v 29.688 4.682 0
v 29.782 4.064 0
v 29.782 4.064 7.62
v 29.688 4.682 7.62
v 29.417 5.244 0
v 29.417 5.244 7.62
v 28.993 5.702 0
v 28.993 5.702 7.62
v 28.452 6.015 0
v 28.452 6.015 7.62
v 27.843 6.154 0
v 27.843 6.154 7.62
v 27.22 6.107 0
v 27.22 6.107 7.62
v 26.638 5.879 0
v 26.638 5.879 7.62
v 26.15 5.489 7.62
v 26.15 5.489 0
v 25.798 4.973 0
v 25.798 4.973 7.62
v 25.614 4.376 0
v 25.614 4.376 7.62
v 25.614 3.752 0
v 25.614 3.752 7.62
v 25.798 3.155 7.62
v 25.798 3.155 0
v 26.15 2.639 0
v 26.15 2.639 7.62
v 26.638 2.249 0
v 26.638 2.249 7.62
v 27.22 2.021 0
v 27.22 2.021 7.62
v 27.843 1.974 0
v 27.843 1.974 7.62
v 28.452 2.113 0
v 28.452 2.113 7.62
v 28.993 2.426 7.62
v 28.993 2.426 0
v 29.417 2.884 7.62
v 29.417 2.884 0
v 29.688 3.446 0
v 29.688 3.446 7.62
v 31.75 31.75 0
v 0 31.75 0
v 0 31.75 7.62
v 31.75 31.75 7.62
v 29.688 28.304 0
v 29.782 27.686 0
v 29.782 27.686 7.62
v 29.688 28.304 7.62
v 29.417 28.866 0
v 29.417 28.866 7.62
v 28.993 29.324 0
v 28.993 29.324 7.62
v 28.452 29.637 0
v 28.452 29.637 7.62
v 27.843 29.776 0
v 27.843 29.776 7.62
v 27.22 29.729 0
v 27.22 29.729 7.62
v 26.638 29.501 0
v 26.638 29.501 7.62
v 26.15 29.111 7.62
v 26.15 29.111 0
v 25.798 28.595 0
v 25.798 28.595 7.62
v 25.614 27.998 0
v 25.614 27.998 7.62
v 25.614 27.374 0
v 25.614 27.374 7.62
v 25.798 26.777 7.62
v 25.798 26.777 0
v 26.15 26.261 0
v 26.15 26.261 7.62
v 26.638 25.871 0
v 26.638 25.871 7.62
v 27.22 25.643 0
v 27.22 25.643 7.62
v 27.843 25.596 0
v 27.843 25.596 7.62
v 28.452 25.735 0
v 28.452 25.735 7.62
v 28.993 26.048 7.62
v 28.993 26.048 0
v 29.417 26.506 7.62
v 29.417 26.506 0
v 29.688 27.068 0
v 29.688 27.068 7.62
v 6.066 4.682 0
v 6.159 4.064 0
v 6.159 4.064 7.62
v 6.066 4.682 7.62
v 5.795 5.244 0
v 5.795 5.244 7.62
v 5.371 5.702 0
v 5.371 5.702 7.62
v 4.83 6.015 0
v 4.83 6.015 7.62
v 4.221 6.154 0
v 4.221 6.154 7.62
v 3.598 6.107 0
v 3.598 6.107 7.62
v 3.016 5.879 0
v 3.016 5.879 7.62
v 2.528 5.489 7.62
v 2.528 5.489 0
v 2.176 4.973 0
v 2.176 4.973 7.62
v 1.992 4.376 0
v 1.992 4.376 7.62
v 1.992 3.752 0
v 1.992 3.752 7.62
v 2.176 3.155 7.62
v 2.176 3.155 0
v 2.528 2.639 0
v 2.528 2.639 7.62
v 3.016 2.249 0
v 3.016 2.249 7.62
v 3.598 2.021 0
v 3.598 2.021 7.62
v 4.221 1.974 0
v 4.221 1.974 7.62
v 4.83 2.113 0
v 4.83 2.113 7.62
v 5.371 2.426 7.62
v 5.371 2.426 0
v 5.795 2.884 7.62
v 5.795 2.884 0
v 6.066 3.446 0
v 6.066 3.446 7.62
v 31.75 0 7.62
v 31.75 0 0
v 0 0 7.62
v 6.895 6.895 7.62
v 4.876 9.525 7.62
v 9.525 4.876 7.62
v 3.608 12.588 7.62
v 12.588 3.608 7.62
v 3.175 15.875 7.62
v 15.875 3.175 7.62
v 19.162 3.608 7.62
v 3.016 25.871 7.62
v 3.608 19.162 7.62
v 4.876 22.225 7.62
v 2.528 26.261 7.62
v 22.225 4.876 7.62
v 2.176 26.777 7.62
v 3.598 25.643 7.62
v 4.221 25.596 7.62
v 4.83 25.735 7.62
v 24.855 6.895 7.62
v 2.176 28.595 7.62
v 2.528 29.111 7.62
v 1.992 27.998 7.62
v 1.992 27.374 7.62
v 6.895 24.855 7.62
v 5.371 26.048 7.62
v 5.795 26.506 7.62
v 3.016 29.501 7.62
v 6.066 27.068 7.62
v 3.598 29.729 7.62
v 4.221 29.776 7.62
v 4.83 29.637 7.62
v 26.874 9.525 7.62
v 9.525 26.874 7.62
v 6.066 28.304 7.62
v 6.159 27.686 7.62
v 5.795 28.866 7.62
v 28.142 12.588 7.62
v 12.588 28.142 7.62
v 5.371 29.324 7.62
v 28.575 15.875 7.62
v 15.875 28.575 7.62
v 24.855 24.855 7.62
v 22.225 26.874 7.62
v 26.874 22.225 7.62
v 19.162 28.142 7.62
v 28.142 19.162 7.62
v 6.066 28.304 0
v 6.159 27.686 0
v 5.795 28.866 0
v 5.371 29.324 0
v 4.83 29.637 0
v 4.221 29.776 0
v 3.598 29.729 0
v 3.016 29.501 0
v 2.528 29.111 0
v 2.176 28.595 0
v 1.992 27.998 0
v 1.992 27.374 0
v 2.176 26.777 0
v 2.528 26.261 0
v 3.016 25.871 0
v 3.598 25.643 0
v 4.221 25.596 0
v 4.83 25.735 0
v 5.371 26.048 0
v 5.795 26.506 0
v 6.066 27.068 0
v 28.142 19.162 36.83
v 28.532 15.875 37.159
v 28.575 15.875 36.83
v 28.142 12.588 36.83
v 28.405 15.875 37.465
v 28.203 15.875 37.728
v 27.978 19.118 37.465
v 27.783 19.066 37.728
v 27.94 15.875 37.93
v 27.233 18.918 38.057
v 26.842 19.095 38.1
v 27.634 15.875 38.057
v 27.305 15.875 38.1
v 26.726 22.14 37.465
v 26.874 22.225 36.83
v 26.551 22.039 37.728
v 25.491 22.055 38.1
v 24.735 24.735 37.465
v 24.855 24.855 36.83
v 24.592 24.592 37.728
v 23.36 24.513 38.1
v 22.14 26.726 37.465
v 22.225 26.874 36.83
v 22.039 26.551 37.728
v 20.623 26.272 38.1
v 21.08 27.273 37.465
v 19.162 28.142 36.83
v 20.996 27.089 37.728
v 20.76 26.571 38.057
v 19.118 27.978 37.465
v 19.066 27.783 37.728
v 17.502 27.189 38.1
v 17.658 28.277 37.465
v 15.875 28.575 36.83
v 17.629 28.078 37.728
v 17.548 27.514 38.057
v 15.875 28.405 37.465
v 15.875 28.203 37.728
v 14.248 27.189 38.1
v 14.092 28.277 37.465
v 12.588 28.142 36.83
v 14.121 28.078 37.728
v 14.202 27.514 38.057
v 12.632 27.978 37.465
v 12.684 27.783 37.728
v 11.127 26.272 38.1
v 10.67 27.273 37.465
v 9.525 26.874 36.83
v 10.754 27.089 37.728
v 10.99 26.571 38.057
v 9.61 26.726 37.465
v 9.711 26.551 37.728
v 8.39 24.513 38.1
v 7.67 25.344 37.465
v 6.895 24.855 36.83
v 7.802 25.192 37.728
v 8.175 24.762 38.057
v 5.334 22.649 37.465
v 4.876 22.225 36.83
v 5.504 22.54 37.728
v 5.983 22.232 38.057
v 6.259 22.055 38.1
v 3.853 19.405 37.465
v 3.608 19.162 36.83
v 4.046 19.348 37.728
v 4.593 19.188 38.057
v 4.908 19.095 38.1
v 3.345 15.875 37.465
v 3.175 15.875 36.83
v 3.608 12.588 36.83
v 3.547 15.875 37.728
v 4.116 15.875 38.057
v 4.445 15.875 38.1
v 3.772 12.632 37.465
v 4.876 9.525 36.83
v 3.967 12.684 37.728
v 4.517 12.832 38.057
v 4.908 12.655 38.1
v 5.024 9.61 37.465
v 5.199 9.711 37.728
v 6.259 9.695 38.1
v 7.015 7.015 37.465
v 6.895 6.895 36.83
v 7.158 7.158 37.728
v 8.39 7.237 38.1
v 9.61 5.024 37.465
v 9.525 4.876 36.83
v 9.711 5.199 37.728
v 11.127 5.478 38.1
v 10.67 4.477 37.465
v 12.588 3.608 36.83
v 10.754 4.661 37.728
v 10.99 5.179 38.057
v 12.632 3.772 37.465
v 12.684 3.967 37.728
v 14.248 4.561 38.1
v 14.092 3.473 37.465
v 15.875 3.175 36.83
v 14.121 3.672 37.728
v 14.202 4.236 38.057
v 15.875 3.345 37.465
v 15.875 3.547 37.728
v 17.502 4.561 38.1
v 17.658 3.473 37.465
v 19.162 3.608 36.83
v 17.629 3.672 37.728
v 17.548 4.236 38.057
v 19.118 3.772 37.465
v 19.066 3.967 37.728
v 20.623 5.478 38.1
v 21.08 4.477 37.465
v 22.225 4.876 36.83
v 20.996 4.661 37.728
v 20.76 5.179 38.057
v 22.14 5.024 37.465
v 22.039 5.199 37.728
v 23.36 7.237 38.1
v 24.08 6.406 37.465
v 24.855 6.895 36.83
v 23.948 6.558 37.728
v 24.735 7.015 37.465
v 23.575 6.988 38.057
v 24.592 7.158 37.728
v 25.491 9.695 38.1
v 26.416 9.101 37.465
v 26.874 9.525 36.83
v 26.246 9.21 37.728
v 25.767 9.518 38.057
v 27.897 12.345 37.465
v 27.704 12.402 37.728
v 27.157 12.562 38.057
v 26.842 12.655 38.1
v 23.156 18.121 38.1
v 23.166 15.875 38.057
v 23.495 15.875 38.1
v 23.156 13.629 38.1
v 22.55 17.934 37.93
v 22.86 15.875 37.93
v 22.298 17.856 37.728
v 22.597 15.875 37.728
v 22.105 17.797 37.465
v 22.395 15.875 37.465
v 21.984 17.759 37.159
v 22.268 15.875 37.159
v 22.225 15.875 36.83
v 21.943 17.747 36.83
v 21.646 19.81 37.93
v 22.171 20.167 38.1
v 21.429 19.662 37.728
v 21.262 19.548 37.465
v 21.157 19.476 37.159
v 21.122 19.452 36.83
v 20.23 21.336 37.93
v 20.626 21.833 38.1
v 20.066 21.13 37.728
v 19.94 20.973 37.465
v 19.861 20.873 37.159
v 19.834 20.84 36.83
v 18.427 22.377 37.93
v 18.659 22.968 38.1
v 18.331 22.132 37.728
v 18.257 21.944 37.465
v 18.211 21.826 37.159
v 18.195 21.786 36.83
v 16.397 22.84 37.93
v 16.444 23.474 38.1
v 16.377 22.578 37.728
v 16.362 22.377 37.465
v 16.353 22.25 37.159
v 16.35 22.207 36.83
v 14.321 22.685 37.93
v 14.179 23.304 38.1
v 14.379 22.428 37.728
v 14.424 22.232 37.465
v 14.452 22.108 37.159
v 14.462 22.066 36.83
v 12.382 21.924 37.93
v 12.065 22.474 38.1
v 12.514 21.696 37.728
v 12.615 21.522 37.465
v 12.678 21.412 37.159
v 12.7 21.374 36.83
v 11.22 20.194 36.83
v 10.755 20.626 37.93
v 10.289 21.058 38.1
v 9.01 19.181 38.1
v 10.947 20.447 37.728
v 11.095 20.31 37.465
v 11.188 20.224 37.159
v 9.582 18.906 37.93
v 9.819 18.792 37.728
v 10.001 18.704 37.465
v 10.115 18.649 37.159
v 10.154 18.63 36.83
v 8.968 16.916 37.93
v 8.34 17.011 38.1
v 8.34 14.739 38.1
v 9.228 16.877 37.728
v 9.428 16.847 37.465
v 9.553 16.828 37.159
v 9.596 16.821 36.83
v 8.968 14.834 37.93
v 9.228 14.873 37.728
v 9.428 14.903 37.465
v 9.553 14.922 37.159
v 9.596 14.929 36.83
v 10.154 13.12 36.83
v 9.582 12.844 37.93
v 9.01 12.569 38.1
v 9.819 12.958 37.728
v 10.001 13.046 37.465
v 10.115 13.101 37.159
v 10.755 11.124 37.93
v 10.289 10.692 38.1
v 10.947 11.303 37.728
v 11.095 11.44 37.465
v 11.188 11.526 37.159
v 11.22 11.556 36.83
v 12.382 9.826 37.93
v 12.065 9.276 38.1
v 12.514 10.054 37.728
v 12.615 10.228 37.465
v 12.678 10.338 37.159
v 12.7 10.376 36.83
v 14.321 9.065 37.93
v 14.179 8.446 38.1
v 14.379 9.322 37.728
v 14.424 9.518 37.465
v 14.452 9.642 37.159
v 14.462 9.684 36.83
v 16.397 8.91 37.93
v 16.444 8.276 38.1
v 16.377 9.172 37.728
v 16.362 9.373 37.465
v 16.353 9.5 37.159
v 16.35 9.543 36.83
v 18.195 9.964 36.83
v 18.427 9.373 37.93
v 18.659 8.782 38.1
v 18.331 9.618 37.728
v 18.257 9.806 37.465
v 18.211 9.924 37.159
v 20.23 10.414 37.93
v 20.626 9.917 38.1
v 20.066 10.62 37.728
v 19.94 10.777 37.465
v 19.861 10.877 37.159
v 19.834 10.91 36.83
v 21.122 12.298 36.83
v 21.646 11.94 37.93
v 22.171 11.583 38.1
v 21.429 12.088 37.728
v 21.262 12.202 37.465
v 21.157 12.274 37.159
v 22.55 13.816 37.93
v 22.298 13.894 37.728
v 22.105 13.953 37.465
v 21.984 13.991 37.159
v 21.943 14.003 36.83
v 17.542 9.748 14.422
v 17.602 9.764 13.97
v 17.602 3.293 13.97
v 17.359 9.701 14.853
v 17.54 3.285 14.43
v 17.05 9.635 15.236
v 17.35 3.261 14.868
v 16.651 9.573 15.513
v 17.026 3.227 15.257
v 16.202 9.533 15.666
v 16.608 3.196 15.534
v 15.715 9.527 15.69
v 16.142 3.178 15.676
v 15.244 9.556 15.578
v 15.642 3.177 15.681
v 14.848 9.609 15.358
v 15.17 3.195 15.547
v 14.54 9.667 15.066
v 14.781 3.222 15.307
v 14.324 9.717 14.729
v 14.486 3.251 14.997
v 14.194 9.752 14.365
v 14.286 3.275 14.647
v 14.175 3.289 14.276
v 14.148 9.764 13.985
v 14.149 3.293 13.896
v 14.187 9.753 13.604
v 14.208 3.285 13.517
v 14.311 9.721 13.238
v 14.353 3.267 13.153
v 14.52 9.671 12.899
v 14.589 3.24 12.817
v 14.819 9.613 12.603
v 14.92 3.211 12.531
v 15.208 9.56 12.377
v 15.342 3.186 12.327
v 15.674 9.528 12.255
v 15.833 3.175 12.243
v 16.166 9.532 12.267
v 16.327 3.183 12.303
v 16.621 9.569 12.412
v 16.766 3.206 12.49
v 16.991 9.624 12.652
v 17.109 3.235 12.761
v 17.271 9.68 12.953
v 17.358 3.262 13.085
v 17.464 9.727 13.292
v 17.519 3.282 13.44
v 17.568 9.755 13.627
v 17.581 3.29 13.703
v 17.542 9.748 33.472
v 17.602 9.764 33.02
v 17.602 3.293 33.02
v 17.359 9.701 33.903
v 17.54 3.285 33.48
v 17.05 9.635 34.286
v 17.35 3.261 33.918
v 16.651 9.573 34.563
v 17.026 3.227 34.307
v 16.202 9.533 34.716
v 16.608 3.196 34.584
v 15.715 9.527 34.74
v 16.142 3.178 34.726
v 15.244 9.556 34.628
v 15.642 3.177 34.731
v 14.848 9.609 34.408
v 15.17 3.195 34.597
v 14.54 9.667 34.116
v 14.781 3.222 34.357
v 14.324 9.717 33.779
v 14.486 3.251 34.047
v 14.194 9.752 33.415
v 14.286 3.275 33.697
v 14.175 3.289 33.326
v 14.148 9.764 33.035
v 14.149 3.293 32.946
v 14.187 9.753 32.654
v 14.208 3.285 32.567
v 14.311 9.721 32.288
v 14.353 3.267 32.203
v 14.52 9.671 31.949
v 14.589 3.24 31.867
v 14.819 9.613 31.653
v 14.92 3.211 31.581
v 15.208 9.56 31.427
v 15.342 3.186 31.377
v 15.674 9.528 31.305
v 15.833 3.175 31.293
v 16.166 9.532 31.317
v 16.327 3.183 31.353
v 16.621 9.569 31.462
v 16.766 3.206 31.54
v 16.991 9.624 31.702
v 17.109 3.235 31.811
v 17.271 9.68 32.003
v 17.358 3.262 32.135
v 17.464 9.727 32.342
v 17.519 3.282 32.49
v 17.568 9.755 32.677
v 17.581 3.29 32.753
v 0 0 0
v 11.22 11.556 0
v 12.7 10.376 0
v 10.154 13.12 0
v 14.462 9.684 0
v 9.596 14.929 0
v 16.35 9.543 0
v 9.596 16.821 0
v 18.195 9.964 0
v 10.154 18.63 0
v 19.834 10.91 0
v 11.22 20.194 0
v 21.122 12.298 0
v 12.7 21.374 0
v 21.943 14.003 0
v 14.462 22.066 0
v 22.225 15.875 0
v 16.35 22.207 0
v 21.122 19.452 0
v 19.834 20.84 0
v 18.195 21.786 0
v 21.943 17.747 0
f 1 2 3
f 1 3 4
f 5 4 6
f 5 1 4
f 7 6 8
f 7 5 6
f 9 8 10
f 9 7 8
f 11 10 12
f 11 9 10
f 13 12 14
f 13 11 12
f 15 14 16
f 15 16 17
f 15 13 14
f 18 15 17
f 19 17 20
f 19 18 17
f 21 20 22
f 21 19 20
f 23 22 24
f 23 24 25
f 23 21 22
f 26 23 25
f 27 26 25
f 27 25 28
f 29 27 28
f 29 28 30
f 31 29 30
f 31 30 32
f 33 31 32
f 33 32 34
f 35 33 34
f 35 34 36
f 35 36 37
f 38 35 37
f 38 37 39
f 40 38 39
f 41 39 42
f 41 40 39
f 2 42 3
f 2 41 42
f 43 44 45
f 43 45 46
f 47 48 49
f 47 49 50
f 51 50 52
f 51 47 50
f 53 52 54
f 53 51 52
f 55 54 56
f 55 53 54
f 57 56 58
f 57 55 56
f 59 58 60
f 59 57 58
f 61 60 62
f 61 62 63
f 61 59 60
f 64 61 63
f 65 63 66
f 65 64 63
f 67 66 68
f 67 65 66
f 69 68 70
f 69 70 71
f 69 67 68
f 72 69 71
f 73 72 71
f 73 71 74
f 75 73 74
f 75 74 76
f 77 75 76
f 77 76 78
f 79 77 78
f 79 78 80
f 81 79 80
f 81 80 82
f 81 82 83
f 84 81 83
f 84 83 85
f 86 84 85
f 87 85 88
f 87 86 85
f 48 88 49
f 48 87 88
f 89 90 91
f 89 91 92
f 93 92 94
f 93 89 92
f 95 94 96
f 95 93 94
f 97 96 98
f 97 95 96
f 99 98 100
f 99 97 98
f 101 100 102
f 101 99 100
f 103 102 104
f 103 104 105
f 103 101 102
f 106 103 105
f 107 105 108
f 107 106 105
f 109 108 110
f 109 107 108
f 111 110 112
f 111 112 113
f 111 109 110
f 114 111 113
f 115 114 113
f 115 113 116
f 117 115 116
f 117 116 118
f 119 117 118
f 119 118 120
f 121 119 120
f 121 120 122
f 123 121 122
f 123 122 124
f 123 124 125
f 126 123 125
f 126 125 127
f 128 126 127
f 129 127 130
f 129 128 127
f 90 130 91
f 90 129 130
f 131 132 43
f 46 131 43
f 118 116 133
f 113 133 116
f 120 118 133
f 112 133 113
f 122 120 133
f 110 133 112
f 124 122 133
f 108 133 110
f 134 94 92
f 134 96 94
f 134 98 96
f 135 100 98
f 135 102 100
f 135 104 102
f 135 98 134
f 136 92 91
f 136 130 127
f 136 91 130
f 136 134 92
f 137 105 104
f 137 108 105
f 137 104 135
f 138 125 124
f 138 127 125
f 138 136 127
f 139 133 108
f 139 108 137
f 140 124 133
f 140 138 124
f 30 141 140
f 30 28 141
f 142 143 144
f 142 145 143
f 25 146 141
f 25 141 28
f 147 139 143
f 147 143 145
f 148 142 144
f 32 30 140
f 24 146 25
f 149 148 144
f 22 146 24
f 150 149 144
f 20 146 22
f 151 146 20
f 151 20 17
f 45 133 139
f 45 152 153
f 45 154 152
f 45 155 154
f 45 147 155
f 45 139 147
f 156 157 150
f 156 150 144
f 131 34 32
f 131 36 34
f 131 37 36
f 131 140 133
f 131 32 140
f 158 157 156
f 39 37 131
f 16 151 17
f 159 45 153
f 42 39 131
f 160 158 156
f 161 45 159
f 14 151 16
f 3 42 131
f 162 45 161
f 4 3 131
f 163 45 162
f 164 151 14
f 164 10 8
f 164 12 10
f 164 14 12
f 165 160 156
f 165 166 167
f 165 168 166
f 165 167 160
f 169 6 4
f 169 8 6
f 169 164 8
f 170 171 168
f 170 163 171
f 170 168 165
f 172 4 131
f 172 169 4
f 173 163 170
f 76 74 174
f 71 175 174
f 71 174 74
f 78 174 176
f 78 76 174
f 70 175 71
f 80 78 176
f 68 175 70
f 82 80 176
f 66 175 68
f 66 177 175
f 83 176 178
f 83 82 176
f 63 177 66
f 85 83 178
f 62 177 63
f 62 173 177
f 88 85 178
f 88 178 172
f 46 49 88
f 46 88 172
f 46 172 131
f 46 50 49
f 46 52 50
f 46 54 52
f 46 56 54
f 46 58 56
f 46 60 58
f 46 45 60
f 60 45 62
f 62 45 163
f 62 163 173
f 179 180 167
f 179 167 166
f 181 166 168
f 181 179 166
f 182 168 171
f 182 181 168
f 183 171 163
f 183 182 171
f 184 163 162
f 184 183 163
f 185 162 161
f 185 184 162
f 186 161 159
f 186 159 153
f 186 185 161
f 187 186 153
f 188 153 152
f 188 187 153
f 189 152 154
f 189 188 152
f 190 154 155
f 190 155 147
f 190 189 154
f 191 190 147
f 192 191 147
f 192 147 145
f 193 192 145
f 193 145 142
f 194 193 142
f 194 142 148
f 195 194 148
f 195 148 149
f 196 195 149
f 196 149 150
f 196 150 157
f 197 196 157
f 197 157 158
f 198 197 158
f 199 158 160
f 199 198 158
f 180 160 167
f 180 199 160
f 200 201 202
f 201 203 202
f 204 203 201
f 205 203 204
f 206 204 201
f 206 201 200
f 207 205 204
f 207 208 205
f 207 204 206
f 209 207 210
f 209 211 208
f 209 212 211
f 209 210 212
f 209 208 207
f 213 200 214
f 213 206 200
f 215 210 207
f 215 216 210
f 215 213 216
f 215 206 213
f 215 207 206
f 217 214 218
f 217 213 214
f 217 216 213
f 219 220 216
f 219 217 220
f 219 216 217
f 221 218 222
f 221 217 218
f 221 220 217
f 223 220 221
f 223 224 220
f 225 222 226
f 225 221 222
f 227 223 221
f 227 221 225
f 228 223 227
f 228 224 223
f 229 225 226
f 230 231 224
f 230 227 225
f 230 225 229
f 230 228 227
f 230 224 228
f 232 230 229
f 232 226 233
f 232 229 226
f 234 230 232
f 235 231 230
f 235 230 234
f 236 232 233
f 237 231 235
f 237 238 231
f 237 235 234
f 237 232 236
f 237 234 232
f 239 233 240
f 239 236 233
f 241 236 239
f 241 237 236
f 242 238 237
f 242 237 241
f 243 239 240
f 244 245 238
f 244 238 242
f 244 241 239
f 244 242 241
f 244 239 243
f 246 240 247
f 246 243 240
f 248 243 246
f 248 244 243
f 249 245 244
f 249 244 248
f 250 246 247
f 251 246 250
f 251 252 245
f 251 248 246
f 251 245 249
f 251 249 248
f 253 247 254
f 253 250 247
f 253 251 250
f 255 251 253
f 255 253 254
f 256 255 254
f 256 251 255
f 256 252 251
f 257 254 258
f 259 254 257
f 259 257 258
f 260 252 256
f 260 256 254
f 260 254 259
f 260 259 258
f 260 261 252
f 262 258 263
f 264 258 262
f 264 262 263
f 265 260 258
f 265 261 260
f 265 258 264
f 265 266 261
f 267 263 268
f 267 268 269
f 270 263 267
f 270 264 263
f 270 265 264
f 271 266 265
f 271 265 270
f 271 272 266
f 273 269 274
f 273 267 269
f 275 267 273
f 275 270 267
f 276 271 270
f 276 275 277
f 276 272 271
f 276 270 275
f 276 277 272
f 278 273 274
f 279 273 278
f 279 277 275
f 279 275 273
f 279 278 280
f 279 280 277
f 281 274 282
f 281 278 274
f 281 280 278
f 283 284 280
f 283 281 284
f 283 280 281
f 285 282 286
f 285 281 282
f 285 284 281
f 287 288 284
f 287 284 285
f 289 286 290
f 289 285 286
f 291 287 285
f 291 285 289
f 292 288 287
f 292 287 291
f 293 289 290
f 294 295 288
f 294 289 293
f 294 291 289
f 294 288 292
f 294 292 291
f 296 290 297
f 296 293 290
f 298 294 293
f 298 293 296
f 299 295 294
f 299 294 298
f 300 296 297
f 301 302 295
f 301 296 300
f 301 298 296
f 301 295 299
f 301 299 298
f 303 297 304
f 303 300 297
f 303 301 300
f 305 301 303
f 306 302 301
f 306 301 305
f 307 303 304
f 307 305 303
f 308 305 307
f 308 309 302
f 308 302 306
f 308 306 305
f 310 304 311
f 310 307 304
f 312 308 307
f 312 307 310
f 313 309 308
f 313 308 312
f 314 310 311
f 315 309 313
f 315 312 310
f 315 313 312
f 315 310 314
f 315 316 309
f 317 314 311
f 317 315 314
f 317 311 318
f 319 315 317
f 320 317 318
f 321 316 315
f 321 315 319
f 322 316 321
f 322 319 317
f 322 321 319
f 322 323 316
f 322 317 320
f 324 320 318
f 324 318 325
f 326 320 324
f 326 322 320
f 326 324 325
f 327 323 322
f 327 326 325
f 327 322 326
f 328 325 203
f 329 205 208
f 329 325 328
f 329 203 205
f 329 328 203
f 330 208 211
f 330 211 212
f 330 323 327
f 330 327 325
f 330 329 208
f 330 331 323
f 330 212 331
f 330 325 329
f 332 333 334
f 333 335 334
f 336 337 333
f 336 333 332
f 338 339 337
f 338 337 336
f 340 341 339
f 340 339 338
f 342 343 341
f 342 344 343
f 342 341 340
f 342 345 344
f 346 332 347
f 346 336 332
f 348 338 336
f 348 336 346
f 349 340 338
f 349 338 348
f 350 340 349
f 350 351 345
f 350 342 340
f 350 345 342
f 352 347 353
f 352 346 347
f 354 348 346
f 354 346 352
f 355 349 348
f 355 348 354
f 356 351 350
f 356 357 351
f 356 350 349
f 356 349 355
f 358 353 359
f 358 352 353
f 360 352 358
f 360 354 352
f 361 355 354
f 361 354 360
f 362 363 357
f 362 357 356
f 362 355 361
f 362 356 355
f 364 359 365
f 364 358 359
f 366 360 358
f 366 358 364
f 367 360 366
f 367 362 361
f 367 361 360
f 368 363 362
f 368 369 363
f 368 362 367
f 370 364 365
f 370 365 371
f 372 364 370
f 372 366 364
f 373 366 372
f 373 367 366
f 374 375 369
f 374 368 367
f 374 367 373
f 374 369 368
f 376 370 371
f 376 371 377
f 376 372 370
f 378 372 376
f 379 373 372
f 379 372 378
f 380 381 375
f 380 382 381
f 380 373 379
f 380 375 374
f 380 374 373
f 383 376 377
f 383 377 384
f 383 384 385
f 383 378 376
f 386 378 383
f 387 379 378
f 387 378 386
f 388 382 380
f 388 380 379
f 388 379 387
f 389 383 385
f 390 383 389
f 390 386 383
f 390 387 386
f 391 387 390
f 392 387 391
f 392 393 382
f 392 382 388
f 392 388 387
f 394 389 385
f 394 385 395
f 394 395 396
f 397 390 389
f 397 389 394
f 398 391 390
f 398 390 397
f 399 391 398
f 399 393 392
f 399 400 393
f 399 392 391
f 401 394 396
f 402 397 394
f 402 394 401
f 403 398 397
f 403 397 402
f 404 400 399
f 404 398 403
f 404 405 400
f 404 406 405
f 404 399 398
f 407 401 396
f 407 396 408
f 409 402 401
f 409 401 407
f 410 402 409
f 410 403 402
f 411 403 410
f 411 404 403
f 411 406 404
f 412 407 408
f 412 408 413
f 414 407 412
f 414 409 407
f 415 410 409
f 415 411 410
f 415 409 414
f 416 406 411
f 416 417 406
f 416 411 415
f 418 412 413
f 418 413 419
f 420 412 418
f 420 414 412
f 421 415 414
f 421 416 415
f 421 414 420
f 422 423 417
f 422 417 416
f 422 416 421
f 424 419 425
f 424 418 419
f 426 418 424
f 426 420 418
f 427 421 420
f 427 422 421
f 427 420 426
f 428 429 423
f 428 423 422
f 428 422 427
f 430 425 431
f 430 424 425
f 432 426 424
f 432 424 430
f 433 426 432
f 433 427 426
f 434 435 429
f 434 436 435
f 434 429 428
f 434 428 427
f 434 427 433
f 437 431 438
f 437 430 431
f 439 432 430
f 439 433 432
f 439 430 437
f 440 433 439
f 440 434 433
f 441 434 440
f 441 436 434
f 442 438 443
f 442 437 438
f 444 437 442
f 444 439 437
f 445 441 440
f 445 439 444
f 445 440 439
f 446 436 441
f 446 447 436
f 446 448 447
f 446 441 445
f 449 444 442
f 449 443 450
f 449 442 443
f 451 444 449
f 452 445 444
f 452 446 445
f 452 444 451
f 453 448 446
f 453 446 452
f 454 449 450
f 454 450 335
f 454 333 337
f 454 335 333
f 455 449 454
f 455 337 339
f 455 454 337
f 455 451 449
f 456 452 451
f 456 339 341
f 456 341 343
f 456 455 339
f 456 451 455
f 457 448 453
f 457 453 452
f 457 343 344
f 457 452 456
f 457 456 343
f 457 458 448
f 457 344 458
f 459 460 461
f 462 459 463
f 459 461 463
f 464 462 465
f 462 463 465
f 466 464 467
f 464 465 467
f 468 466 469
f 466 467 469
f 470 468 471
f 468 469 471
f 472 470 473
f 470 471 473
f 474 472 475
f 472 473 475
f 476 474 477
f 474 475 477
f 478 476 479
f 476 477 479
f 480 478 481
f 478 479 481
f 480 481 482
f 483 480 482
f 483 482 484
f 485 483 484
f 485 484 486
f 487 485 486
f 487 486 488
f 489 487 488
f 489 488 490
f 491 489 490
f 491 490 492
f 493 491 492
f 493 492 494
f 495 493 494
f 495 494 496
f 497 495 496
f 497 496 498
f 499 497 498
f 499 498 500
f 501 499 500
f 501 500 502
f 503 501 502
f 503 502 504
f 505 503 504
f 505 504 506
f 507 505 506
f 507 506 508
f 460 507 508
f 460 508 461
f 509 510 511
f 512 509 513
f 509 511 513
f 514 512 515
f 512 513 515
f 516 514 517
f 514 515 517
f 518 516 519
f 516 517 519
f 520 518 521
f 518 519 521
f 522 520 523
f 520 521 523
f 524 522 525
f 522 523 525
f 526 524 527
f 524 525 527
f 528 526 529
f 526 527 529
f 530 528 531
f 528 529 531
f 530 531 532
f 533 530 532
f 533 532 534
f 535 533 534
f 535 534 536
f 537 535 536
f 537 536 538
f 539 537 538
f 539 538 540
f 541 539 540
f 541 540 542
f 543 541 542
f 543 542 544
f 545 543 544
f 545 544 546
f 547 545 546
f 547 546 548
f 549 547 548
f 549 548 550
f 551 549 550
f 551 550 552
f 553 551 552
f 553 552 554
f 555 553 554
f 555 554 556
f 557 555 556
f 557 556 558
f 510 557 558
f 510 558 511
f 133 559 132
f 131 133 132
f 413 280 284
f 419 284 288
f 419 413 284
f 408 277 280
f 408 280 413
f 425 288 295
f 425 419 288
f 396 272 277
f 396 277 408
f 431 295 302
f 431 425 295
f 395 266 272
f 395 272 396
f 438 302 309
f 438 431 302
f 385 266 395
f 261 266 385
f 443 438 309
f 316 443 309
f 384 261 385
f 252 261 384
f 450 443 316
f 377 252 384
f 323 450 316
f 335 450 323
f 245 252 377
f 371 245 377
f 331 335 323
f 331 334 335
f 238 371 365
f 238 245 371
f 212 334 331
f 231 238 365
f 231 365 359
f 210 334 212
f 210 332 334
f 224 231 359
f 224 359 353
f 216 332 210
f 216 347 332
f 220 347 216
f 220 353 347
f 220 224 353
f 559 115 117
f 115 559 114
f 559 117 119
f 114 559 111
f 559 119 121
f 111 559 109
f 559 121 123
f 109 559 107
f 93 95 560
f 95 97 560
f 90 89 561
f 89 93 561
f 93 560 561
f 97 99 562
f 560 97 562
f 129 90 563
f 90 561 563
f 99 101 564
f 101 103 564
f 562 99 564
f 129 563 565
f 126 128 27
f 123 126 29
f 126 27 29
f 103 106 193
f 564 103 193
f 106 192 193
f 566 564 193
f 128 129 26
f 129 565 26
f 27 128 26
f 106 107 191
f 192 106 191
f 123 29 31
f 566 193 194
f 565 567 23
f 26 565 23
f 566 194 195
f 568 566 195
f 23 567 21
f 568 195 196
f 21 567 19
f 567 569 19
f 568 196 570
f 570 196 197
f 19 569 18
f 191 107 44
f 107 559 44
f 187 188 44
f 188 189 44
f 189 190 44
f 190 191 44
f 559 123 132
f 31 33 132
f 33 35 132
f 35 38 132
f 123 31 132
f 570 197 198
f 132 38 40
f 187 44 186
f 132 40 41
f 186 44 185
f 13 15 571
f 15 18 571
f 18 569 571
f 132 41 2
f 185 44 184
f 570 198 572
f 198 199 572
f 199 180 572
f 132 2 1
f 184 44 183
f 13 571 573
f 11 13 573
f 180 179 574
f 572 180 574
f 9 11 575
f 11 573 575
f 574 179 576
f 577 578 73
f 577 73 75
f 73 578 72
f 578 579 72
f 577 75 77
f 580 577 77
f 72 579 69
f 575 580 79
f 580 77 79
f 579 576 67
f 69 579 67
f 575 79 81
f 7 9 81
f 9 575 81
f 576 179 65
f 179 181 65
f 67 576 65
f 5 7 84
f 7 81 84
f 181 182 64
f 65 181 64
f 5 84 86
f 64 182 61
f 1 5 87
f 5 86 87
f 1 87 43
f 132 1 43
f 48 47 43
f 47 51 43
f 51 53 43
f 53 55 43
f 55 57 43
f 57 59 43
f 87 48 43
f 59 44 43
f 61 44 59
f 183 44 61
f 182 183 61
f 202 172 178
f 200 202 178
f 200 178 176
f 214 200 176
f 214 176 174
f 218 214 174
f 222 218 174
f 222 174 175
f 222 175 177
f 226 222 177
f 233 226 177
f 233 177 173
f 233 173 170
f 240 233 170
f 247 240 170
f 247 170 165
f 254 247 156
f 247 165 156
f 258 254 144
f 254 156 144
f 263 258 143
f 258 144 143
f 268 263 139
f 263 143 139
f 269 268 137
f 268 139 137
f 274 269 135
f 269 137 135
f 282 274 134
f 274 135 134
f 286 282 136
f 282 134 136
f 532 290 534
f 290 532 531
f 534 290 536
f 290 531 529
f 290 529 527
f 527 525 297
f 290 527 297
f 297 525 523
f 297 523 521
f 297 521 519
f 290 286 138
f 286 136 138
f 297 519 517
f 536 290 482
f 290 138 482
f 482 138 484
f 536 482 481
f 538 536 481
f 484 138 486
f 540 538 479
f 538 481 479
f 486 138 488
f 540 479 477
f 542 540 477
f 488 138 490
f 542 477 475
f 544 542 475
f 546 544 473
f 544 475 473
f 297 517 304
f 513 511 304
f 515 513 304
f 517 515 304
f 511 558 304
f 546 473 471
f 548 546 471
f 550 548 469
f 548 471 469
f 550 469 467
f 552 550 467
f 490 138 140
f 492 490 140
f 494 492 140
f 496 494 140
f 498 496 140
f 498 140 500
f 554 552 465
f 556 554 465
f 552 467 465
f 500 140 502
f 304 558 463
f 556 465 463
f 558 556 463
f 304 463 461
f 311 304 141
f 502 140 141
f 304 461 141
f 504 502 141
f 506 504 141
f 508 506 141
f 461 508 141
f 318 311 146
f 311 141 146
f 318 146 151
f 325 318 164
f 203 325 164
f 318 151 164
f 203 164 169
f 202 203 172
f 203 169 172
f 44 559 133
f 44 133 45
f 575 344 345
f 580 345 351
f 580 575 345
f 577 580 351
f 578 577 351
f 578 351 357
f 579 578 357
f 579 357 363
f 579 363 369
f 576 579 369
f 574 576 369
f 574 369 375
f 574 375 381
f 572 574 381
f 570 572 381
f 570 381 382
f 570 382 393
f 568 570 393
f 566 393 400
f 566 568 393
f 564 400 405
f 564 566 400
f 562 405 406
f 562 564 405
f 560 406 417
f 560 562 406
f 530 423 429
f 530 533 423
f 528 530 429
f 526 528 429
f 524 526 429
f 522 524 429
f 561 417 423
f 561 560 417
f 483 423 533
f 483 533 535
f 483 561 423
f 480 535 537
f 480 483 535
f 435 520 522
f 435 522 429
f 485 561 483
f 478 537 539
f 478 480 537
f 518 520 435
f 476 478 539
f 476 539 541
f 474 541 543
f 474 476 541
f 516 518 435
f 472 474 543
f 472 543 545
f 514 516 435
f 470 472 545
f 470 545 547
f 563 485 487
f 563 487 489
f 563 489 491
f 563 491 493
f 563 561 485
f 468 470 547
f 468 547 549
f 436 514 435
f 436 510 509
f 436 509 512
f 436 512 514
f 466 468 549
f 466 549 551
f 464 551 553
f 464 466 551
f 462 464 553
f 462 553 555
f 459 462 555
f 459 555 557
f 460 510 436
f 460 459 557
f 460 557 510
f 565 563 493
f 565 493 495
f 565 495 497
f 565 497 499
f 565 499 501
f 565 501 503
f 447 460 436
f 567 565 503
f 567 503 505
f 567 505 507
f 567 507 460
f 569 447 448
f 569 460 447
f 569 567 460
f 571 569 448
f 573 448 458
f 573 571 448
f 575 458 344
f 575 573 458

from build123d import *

# Parameters (mm, degrees)
F0_W     = 31.75
F0_H     = 31.75
F0_R     = 2.0955
F0_R_2   = 12.7
F1_DEPTH = 7.62
F0_R_3   = 6.35
F2_DEPTH = 38.1
F3_R     = 1.7272
F4_DEPTH = 15.875
F5_R     = 1.27


with BuildPart() as f1:
    # F0 (on Top) → F1 (new body)
    with BuildSketch(Plane.XY):
        with Locations((15.875, 15.875)):
            Rectangle(F0_W, F0_H)
        with Locations((4.064, 4.064)):
            Circle(F0_R, mode=Mode.SUBTRACT)
        with Locations((27.686, 4.064)):
            Circle(F0_R, mode=Mode.SUBTRACT)
        with Locations((4.064, 27.686)):
            Circle(F0_R, mode=Mode.SUBTRACT)
        with Locations((15.875, 15.875)):
            Circle(F0_R_2, mode=Mode.SUBTRACT)
        with Locations((27.686, 27.686)):
            Circle(F0_R, mode=Mode.SUBTRACT)
    extrude(amount=F1_DEPTH)

    # F0 (on Top) → F2 (join)
    with BuildSketch(Plane.XY):
        with Locations((15.875, 15.875)):
            Circle(F0_R_2)
        with Locations((15.875, 15.875)):
            Circle(F0_R_3, mode=Mode.SUBTRACT)
    extrude(amount=F2_DEPTH)

    # F3 (on Front) → F4 (cut)
    with BuildSketch(Plane.XZ):
        with Locations((15.875, 13.97)):
            Circle(F3_R)
        with Locations((15.875, 33.02)):
            Circle(F3_R)
    extrude(amount=-F4_DEPTH, mode=Mode.SUBTRACT)

    # F5
    f5_edges = [f1.edges().sort_by_distance(p)[0] for p in [
        (3.175, 15.875, 38.1),
        (9.525, 15.875, 38.1),
    ]]
    fillet(f5_edges, radius=F5_R)


solid = f1.part
